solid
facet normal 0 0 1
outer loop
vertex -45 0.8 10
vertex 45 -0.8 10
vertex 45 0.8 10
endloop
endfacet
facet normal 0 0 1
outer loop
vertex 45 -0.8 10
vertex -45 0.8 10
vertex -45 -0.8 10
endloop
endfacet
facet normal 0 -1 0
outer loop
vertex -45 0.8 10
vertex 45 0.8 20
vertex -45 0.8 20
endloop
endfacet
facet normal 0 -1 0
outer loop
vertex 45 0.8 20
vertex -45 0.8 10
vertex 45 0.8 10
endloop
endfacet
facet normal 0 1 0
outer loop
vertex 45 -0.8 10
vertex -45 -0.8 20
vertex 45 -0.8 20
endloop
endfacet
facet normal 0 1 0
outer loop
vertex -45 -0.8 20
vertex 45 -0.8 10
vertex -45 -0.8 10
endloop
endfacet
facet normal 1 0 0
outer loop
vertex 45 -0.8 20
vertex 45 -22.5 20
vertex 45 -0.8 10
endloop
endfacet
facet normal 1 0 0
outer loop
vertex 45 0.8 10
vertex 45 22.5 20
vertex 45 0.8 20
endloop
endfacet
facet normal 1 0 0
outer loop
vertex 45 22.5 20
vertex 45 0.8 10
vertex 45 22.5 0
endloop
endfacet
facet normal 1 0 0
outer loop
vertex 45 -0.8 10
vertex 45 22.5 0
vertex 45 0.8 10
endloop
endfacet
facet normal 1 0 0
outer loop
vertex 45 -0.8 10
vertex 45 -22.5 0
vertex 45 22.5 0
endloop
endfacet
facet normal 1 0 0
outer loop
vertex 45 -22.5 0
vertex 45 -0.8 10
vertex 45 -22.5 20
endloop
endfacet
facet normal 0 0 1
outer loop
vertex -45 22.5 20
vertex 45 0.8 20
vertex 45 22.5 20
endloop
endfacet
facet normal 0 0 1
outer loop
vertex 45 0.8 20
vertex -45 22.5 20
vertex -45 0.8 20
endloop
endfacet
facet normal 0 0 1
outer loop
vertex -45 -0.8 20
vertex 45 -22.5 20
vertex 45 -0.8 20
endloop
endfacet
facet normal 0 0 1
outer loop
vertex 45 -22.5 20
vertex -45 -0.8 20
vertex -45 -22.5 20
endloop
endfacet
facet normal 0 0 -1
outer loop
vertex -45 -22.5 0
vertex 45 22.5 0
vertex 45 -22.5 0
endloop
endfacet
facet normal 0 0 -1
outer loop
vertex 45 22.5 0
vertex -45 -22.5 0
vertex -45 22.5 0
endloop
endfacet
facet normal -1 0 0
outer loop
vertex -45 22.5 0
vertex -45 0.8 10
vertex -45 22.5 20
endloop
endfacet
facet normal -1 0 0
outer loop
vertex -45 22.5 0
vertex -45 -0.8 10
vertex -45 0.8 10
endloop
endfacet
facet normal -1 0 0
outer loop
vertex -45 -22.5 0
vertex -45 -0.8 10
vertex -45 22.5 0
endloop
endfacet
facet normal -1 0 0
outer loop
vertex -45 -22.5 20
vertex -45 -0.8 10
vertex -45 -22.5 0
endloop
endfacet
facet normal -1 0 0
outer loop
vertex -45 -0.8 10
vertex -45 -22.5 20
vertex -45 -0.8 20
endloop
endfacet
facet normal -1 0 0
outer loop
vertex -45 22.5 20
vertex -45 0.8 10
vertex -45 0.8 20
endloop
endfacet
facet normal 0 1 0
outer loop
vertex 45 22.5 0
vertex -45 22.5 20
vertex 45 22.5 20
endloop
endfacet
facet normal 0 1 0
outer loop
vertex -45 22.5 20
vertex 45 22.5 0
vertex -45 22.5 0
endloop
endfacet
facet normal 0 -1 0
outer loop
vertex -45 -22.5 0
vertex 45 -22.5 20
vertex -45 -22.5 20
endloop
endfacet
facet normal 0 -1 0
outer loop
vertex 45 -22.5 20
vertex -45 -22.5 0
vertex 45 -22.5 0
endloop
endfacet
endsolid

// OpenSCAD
// Slide drying rack - holds 10 microscope slides standing upright on their long edge
// Print orientation: base block on the bed (z = 0), slots open upward (+Z)

// ---------------- Parameters ----------------
block_len    = 90;    // base block length along X (mm)
block_wid    = 45;    // base block width along Y (mm)
block_h      = 20;    // base block height along Z (mm)

slot_count   = 10;    // number of slide slots
slot_len     = 77;    // slot length along X (mm)
slot_w       = 1.6;   // slot width along Y (mm)
slot_depth   = 10;    // slot depth from top face (mm)
slot_pitch   = 3.5;   // centre-to-centre slot spacing along Y (mm)

eps          = 0.5;   // overcut past faces to avoid coplanar surfaces (mm)

$fn = 64;

// ---------------- Model ----------------
difference() {
    // Solid base block, centred in X and Y, sitting on z = 0
    translate([-block_len / 2, -block_wid / 2, 0])
        cube([block_len, block_wid, block_h]);

    // Parallel slots running along X, centred as a group in X and Y
    for (i = [0 : slot_count - 1]) {
        x = (i - (slot_count - 1) / 2) * slot_pitch;
        translate([x - slot_len / 2, -slot_w / 2, block_h - slot_depth])
            cube([slot_len, slot_w, slot_depth + eps]);
    }
}
